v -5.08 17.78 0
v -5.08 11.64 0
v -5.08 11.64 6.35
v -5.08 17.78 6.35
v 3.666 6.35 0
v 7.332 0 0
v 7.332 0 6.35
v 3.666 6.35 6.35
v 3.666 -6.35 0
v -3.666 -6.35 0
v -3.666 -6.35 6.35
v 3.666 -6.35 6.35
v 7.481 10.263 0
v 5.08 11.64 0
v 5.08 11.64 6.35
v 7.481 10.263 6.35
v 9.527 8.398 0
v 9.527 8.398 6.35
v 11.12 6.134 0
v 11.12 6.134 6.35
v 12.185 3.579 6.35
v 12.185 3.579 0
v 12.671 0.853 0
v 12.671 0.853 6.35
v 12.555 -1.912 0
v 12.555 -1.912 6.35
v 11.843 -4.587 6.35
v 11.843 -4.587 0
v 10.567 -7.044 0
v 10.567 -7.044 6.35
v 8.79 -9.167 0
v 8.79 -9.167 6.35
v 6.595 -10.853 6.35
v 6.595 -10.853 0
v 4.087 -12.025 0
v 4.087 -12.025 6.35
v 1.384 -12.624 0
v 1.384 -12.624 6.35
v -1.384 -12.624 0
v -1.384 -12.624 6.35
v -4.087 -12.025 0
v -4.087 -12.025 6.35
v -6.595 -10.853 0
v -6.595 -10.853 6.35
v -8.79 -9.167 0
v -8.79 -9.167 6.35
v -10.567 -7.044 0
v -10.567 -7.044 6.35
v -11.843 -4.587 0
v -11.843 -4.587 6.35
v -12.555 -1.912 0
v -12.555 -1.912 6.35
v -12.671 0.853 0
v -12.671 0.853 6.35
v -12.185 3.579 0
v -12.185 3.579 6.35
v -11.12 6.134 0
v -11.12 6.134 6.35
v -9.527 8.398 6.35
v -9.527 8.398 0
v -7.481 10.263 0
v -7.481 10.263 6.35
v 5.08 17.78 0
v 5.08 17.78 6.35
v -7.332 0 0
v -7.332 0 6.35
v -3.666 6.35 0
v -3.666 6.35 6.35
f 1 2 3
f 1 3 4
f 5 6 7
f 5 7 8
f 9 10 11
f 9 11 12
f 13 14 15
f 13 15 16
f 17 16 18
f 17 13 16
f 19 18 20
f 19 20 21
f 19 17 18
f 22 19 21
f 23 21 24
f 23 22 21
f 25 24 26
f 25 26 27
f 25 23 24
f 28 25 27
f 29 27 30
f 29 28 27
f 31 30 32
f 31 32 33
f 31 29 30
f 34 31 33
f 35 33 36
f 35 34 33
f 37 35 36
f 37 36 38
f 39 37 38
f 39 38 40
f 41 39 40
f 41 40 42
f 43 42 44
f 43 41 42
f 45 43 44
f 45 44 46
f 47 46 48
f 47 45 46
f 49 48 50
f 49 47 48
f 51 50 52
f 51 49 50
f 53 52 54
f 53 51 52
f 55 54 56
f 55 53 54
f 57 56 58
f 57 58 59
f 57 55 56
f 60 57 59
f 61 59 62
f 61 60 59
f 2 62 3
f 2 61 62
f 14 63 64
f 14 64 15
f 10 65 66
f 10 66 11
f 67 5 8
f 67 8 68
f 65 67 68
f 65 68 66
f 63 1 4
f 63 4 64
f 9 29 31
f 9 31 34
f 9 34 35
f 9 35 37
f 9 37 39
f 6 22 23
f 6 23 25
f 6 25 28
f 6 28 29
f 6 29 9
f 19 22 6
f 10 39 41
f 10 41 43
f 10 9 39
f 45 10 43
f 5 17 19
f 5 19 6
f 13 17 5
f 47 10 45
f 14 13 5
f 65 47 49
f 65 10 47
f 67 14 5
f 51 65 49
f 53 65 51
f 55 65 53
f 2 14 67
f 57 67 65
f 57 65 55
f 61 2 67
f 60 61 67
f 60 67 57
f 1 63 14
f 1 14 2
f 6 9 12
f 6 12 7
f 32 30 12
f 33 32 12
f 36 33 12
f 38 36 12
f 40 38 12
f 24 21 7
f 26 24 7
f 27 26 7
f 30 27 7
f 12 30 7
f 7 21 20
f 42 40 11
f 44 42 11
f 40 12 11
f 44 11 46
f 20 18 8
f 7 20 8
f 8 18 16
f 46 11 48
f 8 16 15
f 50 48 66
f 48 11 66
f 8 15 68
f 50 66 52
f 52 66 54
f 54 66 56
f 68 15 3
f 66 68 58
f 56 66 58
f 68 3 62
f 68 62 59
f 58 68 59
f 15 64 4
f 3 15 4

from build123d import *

# Parameters (mm, degrees)
BOSS_EXTRUDE1_DEPTH = 6.35


with BuildPart() as part:
    # Sketch1 → Boss-Extrude1 (new body)
    with BuildSketch(Plane.XY):
        with BuildLine():
            Line((-5.08, 17.78), (5.08, 17.78))
            Line((5.08, 17.78), (5.08, 11.639742265))
            ThreePointArc((5.08, 11.639742265), (0, -12.7), (-5.08, 11.639742265))
            Line((-5.08, 11.639742265), (-5.08, 17.78))
        make_face()
        Polygon((7.332348419, 0), (3.666174209, 6.35), (-3.666174209, 6.35), (-7.332348419, 0), (-3.666174209, -6.35), (3.666174209, -6.35), align=None, mode=Mode.SUBTRACT)
    extrude(amount=BOSS_EXTRUDE1_DEPTH)


solid = part.part
